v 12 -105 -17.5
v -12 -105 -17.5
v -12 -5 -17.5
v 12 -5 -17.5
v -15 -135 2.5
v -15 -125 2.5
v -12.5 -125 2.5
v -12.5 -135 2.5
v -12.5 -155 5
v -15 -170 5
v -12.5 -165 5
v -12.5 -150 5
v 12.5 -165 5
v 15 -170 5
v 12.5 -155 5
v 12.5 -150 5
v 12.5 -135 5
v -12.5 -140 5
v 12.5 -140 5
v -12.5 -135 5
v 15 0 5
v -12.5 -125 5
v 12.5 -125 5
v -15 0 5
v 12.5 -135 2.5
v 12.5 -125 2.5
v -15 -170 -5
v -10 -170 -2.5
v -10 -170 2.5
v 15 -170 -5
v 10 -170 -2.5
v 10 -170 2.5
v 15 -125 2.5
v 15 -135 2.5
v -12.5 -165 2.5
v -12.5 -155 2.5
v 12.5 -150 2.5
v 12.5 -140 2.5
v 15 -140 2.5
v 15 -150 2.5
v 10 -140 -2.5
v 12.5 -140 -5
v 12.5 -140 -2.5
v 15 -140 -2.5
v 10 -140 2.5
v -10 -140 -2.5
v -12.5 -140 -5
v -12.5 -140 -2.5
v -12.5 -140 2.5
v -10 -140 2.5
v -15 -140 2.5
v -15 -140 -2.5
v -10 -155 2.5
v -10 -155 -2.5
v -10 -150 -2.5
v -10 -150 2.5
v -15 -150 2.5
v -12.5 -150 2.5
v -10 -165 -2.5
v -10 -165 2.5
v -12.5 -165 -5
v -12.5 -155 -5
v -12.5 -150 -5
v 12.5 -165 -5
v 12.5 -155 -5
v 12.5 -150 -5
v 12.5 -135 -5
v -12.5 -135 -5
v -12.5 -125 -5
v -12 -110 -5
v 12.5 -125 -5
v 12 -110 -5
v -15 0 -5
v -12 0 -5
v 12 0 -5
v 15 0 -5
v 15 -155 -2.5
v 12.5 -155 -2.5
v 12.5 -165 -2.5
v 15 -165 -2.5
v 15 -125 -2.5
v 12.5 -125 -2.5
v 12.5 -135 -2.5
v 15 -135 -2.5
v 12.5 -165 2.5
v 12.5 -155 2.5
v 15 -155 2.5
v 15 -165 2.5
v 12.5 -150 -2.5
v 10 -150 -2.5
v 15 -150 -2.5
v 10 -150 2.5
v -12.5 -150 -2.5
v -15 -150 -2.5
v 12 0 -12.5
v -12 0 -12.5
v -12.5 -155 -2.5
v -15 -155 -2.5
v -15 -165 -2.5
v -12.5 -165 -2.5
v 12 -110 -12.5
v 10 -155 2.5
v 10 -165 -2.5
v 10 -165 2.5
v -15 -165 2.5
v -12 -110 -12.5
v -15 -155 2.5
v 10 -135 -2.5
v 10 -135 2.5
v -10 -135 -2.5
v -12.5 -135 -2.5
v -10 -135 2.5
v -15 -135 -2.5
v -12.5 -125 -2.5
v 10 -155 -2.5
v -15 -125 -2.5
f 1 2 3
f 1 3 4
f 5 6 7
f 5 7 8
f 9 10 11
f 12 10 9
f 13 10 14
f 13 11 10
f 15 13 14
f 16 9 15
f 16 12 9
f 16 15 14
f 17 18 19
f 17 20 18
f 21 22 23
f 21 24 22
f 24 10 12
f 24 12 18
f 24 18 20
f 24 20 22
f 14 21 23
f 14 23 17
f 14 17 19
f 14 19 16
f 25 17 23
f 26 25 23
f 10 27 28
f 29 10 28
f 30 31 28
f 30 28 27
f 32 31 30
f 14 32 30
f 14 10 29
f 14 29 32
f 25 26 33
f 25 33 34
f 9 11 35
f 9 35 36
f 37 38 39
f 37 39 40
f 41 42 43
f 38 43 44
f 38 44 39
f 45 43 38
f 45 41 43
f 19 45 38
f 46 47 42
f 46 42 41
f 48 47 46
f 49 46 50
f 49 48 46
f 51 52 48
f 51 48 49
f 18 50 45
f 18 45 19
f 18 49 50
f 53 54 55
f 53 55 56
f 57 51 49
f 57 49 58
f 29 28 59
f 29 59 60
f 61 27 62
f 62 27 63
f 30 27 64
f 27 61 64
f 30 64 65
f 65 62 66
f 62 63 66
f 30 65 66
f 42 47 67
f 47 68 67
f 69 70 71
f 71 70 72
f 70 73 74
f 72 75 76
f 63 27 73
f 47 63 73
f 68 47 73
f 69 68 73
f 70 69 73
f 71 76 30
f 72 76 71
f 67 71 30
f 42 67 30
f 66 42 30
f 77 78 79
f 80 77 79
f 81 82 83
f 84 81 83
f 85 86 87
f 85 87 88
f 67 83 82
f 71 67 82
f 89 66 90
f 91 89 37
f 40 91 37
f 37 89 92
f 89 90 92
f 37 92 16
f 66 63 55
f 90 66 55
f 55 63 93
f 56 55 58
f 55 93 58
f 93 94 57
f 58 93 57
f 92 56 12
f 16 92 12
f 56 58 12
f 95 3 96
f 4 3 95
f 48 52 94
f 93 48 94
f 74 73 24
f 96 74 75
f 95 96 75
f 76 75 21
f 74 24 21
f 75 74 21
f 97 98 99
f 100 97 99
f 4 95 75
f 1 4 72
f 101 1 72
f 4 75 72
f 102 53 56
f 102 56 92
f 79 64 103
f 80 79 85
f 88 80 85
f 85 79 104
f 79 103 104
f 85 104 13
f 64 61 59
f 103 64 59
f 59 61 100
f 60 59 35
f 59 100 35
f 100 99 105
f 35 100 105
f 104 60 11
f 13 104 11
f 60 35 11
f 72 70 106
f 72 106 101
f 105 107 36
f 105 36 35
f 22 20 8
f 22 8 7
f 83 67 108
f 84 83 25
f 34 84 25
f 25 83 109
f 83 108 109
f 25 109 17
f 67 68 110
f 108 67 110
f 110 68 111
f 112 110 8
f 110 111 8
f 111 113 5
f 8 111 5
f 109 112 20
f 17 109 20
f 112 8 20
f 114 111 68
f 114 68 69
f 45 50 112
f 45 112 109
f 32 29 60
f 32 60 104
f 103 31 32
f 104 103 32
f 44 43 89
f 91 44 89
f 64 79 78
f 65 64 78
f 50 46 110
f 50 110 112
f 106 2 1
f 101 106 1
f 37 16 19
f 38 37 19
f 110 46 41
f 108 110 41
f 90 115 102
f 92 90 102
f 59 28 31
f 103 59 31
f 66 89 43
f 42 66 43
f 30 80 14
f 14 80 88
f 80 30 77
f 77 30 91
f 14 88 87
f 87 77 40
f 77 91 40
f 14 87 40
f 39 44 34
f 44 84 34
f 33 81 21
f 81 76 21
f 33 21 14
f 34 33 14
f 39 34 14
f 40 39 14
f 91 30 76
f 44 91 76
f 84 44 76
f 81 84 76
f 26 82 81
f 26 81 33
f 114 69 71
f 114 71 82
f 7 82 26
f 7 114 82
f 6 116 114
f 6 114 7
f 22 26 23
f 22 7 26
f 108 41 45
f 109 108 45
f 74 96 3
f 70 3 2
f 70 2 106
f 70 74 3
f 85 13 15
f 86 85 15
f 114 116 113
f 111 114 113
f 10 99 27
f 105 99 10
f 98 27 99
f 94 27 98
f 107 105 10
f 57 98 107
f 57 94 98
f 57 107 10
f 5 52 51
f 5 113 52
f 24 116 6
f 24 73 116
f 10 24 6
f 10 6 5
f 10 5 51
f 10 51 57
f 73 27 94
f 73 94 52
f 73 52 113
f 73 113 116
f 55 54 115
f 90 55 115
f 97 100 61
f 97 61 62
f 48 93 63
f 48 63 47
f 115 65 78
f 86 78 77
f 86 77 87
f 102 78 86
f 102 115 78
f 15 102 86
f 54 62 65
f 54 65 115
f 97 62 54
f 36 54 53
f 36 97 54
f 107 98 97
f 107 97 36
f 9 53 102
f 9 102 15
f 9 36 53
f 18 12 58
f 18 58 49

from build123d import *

# Parameters (mm, degrees)
F0_W      = 30
F0_H      = 10
F1_DEPTH  = 120
F2_W      = 30
F2_H      = 10
F3_DEPTH  = 50
F4_W      = 10
F4_H      = 5
F5_DEPTH  = 30.001
F6_W      = 25
F6_H      = 10
F7_DEPTH  = 10.001
F8_W      = 20
F8_H      = 5
F9_DEPTH  = 45
F10_W     = 24
F10_H     = 110
F11_DEPTH = 12.5
F12_SIZE  = 5


with BuildPart() as f1:
    # F0 (on Front) → F1 (new body)
    with BuildSketch(Plane.XZ):
        Rectangle(F0_W, F0_H)
    extrude(amount=F1_DEPTH)

    # F2 (on face) → F3 (join)
    with BuildSketch(Plane.XZ.offset(120)):
        Rectangle(F2_W, F2_H)
    extrude(amount=F3_DEPTH)

    # F4 (on face) → F5 (cut, through all)
    with BuildSketch(Plane(origin=(-15, 0, 0), x_dir=(0, -1, 0), z_dir=(-1, 0, 0))):
        with Locations((160, 0)):
            Rectangle(F4_W, F4_H)
        with Locations((145, 0)):
            Rectangle(F4_W, F4_H)
        with Locations((130, 0)):
            Rectangle(F4_W, F4_H)
    extrude(amount=-F5_DEPTH, mode=Mode.SUBTRACT)

    # F6 (on face) → F7 (cut, through all)
    with BuildSketch(Plane.XY.offset(5)):
        with Locations((0, -160)):
            Rectangle(F6_W, F6_H)
        with Locations((0, -145)):
            Rectangle(F6_W, F6_H)
        with Locations((0, -130)):
            Rectangle(F6_W, F6_H)
    extrude(amount=-F7_DEPTH, mode=Mode.SUBTRACT)

    # F8 (on face) → F9 (cut)
    with BuildSketch(Plane.XZ.offset(170)):
        Rectangle(F8_W, F8_H)
    extrude(amount=-F9_DEPTH, mode=Mode.SUBTRACT)

    # F10 (on face) → F11 (join)
    with BuildSketch(Plane(origin=(0, 0, -5), x_dir=(1, 0, 0), z_dir=(0, 0, -1))):
        with Locations((0, 55)):
            Rectangle(F10_W, F10_H)
    extrude(amount=F11_DEPTH)

    # F12
    f12_edges = [f1.edges().sort_by_distance(p)[0] for p in [
        (0, -110, -17.5),
        (0, 0, -17.5),
    ]]
    chamfer(f12_edges, length=F12_SIZE)


solid = f1.part
